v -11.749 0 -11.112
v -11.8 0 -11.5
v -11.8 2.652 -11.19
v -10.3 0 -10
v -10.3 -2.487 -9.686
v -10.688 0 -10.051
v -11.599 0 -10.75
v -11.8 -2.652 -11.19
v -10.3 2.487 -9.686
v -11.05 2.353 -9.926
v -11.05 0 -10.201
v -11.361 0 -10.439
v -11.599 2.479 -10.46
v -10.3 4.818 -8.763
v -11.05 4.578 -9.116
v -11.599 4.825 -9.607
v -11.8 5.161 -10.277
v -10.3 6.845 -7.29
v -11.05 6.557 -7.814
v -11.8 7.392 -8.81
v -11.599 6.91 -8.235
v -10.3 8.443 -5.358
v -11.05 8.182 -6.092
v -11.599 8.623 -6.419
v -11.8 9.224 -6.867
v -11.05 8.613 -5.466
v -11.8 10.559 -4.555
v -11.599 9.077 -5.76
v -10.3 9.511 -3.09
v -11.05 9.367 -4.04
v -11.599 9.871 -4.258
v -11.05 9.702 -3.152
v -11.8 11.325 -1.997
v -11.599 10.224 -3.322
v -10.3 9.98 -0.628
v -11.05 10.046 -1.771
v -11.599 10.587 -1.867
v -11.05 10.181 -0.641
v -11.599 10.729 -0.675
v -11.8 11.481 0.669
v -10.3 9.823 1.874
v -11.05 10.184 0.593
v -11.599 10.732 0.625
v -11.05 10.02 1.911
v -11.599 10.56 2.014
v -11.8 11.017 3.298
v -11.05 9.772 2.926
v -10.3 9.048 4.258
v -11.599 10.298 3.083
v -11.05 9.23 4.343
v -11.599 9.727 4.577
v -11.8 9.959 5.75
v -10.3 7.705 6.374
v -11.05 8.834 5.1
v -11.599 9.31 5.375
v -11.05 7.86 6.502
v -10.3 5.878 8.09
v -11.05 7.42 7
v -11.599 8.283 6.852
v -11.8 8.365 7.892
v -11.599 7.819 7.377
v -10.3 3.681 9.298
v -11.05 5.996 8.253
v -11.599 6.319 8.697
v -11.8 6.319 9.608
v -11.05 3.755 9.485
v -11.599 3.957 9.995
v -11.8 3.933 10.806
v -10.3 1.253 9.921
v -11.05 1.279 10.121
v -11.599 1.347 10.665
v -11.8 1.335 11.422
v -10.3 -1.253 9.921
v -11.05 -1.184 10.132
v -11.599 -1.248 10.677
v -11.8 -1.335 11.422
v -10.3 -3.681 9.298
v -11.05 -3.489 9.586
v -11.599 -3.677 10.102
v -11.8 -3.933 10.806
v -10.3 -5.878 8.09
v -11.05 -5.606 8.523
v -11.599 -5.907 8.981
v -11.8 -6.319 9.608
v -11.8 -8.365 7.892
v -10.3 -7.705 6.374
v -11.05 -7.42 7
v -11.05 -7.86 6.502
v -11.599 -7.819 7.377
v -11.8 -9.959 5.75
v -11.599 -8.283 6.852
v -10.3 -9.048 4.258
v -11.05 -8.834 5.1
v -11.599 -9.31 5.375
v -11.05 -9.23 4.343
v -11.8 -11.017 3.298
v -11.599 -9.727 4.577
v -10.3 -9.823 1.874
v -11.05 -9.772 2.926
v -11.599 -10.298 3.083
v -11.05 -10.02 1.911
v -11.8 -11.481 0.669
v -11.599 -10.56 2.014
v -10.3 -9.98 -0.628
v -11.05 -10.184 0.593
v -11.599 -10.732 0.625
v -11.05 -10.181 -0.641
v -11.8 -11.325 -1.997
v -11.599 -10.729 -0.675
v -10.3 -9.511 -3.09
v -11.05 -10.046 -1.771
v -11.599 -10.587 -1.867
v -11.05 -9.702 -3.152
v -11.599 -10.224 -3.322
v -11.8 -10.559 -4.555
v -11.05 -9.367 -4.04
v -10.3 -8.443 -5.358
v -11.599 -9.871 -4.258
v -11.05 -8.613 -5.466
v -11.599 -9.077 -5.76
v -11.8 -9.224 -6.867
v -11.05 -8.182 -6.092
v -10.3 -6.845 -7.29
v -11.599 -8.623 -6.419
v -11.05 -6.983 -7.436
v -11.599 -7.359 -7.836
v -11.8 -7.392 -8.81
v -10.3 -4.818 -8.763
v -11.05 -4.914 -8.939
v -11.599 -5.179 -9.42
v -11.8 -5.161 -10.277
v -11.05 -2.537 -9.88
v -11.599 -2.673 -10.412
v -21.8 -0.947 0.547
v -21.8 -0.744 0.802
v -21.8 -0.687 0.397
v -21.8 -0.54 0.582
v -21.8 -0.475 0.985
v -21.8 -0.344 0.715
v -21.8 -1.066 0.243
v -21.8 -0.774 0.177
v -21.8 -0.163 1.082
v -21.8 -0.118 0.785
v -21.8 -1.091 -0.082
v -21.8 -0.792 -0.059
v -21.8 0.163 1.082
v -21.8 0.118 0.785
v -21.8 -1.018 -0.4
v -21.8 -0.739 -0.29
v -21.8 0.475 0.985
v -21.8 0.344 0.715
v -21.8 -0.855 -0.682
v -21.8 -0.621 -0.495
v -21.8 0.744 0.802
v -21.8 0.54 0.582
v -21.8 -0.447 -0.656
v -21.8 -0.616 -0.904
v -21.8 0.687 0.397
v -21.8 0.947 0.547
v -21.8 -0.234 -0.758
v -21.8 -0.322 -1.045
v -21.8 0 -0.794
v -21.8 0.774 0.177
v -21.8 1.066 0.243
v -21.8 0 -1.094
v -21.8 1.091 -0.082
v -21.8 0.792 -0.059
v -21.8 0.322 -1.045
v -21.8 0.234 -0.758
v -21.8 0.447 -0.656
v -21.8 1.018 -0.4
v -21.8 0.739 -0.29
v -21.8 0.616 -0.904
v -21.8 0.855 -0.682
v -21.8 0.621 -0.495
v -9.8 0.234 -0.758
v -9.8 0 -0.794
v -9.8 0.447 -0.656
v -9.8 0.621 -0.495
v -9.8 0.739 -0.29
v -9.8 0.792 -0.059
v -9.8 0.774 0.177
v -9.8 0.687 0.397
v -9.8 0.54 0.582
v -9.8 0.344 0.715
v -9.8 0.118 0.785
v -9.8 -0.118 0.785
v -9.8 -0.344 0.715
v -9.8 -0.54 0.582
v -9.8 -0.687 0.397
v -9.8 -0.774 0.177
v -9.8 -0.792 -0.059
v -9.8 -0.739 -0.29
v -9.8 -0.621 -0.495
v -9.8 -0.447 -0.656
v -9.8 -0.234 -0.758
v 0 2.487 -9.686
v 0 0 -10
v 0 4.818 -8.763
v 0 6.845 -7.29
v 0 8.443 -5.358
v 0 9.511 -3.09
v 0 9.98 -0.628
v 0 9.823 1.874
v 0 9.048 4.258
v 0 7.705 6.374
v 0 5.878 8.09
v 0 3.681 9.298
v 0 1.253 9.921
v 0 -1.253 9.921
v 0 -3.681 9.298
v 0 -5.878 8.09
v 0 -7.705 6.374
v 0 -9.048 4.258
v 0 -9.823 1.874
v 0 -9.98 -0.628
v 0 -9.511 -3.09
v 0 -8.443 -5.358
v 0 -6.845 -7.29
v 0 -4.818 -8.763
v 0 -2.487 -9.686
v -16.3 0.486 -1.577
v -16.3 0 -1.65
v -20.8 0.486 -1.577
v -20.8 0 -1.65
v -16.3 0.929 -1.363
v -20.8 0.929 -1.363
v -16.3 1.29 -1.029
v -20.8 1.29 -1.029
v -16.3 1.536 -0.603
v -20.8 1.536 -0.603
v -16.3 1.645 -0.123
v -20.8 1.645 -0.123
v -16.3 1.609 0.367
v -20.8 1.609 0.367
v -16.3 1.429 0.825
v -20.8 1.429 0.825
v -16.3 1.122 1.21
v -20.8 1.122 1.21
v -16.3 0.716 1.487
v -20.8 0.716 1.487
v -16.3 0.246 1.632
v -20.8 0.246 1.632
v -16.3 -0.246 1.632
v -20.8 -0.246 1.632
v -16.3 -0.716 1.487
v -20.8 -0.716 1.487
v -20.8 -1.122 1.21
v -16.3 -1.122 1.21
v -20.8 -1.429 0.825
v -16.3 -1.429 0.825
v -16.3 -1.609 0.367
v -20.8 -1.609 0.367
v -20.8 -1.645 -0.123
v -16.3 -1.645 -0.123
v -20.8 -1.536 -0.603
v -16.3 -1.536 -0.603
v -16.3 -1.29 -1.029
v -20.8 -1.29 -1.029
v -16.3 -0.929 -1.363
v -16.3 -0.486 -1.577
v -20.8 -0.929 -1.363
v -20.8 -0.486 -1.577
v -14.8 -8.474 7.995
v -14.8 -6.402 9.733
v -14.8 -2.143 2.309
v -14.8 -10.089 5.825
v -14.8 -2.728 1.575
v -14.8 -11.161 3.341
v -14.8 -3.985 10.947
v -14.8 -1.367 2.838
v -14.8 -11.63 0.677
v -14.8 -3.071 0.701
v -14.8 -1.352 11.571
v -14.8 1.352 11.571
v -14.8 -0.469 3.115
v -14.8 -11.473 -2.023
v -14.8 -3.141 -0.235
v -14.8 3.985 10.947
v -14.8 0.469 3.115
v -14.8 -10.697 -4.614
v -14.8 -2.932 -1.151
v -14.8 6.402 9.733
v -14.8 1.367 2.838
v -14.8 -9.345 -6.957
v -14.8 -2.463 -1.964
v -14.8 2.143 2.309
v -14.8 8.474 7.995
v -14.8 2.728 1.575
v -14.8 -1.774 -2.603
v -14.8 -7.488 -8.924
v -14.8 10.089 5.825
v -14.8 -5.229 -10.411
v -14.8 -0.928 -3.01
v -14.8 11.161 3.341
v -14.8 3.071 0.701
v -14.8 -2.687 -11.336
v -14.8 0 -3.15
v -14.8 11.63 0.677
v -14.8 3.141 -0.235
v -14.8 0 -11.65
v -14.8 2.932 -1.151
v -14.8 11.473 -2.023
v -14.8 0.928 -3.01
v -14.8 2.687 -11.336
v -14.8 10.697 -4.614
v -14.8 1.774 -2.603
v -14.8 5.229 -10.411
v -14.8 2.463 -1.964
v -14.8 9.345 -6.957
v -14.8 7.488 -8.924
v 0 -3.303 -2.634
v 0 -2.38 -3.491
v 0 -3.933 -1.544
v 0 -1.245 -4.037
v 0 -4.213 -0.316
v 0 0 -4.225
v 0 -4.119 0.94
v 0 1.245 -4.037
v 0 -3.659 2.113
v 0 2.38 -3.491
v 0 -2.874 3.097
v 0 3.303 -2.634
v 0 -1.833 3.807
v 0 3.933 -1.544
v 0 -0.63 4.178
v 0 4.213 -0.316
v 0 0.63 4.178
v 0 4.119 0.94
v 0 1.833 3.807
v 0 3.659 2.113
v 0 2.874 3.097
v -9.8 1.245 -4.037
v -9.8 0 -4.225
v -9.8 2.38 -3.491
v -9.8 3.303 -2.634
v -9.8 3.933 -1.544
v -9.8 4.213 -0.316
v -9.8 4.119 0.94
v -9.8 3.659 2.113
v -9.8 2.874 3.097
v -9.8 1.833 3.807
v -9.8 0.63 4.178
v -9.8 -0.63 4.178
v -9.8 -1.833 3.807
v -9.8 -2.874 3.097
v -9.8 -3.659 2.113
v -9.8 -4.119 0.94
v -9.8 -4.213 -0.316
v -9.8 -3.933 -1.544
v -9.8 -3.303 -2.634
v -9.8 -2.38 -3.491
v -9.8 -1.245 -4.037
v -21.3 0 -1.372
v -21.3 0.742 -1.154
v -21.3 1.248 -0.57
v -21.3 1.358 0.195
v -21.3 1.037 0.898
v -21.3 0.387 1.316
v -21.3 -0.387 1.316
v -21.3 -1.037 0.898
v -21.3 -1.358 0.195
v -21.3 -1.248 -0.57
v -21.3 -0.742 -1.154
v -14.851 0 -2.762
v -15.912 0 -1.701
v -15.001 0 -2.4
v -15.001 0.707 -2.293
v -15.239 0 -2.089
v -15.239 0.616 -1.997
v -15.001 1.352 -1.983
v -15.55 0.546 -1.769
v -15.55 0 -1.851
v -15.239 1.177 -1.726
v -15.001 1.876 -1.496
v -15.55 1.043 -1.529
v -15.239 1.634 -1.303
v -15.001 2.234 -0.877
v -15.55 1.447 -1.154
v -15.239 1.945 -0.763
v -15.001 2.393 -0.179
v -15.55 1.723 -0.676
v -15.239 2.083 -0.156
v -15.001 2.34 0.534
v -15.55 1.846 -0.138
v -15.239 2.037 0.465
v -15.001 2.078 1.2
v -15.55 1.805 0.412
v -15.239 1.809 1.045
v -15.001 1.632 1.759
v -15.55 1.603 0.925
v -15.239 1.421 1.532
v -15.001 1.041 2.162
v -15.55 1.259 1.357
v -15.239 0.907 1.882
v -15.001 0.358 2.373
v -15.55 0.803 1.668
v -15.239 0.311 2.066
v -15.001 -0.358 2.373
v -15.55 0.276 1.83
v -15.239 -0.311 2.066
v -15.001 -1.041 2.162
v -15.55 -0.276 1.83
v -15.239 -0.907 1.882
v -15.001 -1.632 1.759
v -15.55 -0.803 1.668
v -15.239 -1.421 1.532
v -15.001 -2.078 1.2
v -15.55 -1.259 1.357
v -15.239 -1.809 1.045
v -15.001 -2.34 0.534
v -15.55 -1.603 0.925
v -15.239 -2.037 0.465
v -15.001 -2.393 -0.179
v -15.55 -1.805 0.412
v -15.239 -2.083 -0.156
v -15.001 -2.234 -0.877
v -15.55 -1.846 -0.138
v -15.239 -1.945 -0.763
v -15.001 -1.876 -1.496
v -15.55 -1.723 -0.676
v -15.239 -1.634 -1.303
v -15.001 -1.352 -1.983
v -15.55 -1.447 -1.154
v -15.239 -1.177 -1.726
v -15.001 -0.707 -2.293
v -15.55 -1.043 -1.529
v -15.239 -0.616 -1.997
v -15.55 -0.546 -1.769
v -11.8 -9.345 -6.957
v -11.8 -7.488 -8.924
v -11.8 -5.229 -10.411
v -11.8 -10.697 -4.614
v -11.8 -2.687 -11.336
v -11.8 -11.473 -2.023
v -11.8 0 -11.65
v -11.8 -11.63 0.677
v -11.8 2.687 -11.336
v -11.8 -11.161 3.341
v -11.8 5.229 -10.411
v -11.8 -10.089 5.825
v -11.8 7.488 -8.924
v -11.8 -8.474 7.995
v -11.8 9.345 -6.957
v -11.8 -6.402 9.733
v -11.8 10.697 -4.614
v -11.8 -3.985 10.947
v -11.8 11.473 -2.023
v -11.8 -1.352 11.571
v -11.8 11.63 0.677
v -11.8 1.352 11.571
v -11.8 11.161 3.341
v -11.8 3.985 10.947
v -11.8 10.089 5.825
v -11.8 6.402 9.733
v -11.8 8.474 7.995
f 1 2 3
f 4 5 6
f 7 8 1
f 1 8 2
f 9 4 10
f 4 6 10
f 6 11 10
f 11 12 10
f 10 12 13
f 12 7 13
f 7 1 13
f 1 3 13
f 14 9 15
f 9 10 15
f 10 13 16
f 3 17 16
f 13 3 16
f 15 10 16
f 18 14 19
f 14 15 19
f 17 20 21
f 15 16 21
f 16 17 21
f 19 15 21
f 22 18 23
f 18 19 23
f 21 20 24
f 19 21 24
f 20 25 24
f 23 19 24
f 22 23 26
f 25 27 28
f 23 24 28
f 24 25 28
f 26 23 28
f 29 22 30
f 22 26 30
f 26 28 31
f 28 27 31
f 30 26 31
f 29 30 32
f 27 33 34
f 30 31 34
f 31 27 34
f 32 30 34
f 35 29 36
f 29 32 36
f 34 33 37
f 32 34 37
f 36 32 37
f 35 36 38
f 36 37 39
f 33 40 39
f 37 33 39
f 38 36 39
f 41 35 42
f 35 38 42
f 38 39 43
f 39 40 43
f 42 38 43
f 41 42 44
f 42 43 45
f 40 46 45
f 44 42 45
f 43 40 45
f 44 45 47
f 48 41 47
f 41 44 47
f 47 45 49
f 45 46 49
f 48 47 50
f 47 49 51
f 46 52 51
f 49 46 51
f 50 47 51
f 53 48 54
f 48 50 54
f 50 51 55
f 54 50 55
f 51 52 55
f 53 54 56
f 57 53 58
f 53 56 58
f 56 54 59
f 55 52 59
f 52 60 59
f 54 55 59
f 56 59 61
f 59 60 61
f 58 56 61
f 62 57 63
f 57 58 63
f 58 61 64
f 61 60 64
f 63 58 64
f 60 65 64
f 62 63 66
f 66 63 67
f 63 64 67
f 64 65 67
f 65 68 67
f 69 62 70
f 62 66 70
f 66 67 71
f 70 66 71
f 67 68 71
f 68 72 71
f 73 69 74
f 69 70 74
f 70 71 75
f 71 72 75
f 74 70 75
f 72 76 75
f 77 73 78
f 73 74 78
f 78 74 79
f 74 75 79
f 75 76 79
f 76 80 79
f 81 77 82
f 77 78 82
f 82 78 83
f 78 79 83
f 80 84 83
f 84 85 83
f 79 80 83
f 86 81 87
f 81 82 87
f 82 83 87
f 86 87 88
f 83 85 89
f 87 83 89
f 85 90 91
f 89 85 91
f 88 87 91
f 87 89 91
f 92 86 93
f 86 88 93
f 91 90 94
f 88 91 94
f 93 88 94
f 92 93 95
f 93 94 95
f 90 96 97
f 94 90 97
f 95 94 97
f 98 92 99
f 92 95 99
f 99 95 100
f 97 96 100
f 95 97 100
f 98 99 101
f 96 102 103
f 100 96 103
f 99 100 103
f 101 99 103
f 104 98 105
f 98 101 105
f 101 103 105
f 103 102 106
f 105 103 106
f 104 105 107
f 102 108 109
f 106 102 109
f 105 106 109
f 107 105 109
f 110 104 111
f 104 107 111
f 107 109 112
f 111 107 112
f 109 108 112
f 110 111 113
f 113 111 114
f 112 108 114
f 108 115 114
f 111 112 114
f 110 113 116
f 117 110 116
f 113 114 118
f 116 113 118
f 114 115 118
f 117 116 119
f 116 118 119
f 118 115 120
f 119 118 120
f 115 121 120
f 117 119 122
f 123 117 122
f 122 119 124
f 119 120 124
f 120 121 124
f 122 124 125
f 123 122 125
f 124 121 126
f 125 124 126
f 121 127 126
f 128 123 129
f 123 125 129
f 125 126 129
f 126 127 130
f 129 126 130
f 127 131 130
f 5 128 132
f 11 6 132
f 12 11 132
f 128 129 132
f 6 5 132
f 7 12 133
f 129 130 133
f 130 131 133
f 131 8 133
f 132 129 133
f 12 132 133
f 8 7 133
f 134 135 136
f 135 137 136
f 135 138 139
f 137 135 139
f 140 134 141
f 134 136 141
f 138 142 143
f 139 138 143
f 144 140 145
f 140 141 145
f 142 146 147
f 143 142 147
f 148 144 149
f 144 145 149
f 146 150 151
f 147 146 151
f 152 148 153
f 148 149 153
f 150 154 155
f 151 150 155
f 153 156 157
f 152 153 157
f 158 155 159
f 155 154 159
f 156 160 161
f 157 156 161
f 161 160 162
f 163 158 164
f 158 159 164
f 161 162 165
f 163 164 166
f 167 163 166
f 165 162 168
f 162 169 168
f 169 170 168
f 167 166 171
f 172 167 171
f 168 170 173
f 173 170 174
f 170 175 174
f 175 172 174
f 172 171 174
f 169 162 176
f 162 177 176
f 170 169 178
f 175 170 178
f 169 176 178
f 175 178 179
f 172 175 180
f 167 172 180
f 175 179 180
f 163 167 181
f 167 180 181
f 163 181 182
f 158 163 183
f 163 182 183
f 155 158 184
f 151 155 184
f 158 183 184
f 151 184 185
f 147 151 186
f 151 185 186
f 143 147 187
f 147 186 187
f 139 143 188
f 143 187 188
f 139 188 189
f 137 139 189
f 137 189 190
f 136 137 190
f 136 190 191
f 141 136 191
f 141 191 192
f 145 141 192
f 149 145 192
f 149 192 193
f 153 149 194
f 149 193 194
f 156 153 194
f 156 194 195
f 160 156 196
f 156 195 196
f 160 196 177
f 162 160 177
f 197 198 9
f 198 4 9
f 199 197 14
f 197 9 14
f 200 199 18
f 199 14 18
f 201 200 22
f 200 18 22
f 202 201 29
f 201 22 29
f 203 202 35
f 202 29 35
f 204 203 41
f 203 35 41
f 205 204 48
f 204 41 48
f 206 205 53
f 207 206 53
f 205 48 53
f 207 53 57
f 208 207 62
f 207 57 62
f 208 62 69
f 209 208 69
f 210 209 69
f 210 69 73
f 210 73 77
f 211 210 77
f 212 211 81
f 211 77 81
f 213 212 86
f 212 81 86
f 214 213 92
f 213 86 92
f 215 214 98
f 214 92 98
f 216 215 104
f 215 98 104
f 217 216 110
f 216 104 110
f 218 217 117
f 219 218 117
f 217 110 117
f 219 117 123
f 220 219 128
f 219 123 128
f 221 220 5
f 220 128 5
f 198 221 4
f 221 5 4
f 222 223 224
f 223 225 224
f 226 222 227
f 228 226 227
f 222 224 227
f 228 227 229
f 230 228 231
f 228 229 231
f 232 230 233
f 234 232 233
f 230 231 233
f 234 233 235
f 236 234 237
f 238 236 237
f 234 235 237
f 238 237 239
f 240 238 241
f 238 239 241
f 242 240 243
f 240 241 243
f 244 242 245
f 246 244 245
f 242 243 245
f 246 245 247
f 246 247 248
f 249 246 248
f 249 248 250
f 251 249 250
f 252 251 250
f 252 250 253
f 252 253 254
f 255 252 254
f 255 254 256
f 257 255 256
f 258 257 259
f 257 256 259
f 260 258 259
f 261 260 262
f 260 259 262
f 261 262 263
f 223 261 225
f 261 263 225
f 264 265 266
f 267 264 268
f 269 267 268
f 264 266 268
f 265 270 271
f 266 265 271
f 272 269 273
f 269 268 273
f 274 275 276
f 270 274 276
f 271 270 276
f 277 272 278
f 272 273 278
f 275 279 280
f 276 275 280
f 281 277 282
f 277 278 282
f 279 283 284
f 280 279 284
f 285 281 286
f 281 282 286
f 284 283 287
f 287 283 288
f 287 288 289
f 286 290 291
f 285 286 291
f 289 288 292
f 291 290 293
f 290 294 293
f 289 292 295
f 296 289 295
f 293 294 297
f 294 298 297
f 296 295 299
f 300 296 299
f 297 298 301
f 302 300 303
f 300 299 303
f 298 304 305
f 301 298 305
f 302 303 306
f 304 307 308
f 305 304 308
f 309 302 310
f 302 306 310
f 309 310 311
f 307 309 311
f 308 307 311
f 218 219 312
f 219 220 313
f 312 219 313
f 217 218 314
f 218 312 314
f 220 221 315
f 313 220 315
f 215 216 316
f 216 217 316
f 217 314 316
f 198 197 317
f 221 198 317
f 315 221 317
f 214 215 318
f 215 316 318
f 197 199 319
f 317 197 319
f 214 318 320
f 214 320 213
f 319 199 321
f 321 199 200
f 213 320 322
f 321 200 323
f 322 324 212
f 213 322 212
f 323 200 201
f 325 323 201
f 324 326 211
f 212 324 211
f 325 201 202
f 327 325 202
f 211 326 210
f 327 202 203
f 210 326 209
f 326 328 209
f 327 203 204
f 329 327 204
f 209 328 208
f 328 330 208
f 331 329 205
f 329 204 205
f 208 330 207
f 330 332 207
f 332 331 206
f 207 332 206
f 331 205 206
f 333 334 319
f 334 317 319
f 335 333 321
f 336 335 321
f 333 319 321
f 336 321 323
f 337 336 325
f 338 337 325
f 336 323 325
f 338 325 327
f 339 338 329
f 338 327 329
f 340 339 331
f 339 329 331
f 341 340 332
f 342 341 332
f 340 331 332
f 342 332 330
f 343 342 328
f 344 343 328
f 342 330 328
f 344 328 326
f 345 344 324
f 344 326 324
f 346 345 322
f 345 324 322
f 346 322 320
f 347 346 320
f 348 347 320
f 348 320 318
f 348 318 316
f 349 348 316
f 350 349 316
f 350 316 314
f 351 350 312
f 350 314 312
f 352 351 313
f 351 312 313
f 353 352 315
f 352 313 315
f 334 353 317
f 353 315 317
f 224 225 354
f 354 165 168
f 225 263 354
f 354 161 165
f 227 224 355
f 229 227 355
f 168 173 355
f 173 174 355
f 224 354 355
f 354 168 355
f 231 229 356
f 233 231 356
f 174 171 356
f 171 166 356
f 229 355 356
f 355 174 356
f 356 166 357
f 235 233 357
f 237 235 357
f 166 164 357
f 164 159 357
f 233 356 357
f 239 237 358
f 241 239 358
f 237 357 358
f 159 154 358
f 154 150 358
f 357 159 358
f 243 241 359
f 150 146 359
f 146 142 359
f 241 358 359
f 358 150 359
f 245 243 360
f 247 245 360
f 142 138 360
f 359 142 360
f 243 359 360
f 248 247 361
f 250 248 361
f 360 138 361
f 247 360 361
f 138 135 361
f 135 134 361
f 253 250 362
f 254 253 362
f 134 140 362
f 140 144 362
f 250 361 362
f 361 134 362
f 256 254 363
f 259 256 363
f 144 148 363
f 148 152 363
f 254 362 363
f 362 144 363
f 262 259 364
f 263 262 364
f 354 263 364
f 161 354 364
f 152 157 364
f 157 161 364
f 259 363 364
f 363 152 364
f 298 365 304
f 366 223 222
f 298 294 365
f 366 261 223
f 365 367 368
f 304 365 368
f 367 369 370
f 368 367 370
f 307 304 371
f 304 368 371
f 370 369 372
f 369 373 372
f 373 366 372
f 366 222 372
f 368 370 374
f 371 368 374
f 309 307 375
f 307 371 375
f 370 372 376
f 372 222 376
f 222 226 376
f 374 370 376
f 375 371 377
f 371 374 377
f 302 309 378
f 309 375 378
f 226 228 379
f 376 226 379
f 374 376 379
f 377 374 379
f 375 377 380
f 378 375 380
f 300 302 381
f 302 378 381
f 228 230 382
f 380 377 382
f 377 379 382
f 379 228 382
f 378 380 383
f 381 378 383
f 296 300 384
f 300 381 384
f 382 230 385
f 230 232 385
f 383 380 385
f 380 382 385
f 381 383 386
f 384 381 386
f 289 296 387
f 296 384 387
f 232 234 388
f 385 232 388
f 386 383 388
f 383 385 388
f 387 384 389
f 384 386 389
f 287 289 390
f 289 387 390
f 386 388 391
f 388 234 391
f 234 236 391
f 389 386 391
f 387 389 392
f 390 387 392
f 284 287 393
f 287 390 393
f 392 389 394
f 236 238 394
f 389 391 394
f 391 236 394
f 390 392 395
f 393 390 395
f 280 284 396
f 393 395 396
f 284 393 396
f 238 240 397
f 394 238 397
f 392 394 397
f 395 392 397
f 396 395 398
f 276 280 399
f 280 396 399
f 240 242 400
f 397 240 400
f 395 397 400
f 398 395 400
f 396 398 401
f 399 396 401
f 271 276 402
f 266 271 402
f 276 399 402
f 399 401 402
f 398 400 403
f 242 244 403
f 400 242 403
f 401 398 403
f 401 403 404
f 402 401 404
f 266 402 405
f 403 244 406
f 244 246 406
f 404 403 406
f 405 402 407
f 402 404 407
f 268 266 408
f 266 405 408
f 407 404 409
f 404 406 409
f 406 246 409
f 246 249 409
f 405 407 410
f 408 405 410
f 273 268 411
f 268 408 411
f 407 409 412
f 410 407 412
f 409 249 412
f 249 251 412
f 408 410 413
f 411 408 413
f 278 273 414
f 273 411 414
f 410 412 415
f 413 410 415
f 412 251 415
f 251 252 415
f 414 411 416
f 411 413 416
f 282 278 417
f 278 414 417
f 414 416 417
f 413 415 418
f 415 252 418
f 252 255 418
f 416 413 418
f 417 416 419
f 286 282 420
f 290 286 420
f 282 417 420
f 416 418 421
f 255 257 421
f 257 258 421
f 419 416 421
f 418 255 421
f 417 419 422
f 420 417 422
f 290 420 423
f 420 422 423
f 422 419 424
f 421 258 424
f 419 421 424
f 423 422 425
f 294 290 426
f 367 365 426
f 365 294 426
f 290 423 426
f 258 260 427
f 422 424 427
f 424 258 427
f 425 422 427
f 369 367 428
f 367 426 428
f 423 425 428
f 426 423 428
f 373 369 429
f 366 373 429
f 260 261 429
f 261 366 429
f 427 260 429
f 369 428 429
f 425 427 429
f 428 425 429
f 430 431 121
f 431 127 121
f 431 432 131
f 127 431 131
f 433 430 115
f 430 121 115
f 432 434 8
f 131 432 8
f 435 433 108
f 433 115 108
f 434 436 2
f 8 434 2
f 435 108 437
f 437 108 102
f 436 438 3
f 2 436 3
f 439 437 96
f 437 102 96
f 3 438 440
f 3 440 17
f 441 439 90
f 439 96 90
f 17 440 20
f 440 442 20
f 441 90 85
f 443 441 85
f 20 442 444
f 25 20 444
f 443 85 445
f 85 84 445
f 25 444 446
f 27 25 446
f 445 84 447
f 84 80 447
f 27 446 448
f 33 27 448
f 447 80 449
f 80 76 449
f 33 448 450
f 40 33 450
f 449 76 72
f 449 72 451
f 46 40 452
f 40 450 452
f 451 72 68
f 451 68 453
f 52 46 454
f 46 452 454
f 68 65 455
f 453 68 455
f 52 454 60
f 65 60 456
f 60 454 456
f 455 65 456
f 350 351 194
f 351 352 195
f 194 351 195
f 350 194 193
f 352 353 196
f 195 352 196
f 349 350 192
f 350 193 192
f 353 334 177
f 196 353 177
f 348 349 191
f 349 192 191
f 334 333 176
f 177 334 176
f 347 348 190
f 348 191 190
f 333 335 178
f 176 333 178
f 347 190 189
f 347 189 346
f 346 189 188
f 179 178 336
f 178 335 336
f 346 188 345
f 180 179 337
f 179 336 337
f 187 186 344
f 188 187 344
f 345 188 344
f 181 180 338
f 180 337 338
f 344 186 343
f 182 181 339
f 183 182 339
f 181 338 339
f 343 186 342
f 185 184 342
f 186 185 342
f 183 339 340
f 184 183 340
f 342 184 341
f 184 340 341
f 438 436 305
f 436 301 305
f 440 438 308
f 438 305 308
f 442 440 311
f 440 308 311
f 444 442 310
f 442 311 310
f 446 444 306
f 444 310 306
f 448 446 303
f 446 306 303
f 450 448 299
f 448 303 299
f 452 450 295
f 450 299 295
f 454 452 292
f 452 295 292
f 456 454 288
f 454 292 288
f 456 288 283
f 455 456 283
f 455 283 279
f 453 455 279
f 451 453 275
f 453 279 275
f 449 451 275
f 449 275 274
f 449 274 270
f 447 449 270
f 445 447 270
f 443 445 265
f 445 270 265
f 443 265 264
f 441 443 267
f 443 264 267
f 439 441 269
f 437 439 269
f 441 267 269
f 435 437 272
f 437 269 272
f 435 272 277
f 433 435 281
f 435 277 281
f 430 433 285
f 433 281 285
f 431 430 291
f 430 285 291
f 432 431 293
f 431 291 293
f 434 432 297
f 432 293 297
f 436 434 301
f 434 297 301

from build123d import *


with BuildPart() as part:
    # Sketch1 → Revolve1 (revolve)
    with BuildSketch(Plane(origin=(0, 0, 0), x_dir=(1, 0, 0), z_dir=(0, 1, 0))):
        with BuildLine():
            Line((-14.8, 11.65), (-14.8, 3.15))
            ThreePointArc((-14.8, 3.15), (-15.239339828, 2.089339828), (-16.3, 1.65))
            Line((-16.3, 1.65), (-20.8, 1.65))
            Line((-20.8, 1.65), (-21.8, 1.09375))
            Line((-21.8, 1.09375), (-21.8, 0.79375))
            Line((-21.8, 0.79375), (-9.8, 0.79375))
            Line((-9.8, 0.79375), (-9.8, 4.225))
            Line((-9.8, 4.225), (0, 4.225))
            Line((0, 4.225), (0, 10))
            Line((0, 10), (-10.3, 10))
            ThreePointArc((-10.3, 10), (-11.360660172, 10.439339828), (-11.8, 11.5))
            Line((-11.8, 11.5), (-11.8, 11.65))
            Line((-11.8, 11.65), (-14.8, 11.65))
        make_face()
    revolve(axis=Axis((-74.867571618, 0, 0), (1, 0, 0)))


solid = part.part
